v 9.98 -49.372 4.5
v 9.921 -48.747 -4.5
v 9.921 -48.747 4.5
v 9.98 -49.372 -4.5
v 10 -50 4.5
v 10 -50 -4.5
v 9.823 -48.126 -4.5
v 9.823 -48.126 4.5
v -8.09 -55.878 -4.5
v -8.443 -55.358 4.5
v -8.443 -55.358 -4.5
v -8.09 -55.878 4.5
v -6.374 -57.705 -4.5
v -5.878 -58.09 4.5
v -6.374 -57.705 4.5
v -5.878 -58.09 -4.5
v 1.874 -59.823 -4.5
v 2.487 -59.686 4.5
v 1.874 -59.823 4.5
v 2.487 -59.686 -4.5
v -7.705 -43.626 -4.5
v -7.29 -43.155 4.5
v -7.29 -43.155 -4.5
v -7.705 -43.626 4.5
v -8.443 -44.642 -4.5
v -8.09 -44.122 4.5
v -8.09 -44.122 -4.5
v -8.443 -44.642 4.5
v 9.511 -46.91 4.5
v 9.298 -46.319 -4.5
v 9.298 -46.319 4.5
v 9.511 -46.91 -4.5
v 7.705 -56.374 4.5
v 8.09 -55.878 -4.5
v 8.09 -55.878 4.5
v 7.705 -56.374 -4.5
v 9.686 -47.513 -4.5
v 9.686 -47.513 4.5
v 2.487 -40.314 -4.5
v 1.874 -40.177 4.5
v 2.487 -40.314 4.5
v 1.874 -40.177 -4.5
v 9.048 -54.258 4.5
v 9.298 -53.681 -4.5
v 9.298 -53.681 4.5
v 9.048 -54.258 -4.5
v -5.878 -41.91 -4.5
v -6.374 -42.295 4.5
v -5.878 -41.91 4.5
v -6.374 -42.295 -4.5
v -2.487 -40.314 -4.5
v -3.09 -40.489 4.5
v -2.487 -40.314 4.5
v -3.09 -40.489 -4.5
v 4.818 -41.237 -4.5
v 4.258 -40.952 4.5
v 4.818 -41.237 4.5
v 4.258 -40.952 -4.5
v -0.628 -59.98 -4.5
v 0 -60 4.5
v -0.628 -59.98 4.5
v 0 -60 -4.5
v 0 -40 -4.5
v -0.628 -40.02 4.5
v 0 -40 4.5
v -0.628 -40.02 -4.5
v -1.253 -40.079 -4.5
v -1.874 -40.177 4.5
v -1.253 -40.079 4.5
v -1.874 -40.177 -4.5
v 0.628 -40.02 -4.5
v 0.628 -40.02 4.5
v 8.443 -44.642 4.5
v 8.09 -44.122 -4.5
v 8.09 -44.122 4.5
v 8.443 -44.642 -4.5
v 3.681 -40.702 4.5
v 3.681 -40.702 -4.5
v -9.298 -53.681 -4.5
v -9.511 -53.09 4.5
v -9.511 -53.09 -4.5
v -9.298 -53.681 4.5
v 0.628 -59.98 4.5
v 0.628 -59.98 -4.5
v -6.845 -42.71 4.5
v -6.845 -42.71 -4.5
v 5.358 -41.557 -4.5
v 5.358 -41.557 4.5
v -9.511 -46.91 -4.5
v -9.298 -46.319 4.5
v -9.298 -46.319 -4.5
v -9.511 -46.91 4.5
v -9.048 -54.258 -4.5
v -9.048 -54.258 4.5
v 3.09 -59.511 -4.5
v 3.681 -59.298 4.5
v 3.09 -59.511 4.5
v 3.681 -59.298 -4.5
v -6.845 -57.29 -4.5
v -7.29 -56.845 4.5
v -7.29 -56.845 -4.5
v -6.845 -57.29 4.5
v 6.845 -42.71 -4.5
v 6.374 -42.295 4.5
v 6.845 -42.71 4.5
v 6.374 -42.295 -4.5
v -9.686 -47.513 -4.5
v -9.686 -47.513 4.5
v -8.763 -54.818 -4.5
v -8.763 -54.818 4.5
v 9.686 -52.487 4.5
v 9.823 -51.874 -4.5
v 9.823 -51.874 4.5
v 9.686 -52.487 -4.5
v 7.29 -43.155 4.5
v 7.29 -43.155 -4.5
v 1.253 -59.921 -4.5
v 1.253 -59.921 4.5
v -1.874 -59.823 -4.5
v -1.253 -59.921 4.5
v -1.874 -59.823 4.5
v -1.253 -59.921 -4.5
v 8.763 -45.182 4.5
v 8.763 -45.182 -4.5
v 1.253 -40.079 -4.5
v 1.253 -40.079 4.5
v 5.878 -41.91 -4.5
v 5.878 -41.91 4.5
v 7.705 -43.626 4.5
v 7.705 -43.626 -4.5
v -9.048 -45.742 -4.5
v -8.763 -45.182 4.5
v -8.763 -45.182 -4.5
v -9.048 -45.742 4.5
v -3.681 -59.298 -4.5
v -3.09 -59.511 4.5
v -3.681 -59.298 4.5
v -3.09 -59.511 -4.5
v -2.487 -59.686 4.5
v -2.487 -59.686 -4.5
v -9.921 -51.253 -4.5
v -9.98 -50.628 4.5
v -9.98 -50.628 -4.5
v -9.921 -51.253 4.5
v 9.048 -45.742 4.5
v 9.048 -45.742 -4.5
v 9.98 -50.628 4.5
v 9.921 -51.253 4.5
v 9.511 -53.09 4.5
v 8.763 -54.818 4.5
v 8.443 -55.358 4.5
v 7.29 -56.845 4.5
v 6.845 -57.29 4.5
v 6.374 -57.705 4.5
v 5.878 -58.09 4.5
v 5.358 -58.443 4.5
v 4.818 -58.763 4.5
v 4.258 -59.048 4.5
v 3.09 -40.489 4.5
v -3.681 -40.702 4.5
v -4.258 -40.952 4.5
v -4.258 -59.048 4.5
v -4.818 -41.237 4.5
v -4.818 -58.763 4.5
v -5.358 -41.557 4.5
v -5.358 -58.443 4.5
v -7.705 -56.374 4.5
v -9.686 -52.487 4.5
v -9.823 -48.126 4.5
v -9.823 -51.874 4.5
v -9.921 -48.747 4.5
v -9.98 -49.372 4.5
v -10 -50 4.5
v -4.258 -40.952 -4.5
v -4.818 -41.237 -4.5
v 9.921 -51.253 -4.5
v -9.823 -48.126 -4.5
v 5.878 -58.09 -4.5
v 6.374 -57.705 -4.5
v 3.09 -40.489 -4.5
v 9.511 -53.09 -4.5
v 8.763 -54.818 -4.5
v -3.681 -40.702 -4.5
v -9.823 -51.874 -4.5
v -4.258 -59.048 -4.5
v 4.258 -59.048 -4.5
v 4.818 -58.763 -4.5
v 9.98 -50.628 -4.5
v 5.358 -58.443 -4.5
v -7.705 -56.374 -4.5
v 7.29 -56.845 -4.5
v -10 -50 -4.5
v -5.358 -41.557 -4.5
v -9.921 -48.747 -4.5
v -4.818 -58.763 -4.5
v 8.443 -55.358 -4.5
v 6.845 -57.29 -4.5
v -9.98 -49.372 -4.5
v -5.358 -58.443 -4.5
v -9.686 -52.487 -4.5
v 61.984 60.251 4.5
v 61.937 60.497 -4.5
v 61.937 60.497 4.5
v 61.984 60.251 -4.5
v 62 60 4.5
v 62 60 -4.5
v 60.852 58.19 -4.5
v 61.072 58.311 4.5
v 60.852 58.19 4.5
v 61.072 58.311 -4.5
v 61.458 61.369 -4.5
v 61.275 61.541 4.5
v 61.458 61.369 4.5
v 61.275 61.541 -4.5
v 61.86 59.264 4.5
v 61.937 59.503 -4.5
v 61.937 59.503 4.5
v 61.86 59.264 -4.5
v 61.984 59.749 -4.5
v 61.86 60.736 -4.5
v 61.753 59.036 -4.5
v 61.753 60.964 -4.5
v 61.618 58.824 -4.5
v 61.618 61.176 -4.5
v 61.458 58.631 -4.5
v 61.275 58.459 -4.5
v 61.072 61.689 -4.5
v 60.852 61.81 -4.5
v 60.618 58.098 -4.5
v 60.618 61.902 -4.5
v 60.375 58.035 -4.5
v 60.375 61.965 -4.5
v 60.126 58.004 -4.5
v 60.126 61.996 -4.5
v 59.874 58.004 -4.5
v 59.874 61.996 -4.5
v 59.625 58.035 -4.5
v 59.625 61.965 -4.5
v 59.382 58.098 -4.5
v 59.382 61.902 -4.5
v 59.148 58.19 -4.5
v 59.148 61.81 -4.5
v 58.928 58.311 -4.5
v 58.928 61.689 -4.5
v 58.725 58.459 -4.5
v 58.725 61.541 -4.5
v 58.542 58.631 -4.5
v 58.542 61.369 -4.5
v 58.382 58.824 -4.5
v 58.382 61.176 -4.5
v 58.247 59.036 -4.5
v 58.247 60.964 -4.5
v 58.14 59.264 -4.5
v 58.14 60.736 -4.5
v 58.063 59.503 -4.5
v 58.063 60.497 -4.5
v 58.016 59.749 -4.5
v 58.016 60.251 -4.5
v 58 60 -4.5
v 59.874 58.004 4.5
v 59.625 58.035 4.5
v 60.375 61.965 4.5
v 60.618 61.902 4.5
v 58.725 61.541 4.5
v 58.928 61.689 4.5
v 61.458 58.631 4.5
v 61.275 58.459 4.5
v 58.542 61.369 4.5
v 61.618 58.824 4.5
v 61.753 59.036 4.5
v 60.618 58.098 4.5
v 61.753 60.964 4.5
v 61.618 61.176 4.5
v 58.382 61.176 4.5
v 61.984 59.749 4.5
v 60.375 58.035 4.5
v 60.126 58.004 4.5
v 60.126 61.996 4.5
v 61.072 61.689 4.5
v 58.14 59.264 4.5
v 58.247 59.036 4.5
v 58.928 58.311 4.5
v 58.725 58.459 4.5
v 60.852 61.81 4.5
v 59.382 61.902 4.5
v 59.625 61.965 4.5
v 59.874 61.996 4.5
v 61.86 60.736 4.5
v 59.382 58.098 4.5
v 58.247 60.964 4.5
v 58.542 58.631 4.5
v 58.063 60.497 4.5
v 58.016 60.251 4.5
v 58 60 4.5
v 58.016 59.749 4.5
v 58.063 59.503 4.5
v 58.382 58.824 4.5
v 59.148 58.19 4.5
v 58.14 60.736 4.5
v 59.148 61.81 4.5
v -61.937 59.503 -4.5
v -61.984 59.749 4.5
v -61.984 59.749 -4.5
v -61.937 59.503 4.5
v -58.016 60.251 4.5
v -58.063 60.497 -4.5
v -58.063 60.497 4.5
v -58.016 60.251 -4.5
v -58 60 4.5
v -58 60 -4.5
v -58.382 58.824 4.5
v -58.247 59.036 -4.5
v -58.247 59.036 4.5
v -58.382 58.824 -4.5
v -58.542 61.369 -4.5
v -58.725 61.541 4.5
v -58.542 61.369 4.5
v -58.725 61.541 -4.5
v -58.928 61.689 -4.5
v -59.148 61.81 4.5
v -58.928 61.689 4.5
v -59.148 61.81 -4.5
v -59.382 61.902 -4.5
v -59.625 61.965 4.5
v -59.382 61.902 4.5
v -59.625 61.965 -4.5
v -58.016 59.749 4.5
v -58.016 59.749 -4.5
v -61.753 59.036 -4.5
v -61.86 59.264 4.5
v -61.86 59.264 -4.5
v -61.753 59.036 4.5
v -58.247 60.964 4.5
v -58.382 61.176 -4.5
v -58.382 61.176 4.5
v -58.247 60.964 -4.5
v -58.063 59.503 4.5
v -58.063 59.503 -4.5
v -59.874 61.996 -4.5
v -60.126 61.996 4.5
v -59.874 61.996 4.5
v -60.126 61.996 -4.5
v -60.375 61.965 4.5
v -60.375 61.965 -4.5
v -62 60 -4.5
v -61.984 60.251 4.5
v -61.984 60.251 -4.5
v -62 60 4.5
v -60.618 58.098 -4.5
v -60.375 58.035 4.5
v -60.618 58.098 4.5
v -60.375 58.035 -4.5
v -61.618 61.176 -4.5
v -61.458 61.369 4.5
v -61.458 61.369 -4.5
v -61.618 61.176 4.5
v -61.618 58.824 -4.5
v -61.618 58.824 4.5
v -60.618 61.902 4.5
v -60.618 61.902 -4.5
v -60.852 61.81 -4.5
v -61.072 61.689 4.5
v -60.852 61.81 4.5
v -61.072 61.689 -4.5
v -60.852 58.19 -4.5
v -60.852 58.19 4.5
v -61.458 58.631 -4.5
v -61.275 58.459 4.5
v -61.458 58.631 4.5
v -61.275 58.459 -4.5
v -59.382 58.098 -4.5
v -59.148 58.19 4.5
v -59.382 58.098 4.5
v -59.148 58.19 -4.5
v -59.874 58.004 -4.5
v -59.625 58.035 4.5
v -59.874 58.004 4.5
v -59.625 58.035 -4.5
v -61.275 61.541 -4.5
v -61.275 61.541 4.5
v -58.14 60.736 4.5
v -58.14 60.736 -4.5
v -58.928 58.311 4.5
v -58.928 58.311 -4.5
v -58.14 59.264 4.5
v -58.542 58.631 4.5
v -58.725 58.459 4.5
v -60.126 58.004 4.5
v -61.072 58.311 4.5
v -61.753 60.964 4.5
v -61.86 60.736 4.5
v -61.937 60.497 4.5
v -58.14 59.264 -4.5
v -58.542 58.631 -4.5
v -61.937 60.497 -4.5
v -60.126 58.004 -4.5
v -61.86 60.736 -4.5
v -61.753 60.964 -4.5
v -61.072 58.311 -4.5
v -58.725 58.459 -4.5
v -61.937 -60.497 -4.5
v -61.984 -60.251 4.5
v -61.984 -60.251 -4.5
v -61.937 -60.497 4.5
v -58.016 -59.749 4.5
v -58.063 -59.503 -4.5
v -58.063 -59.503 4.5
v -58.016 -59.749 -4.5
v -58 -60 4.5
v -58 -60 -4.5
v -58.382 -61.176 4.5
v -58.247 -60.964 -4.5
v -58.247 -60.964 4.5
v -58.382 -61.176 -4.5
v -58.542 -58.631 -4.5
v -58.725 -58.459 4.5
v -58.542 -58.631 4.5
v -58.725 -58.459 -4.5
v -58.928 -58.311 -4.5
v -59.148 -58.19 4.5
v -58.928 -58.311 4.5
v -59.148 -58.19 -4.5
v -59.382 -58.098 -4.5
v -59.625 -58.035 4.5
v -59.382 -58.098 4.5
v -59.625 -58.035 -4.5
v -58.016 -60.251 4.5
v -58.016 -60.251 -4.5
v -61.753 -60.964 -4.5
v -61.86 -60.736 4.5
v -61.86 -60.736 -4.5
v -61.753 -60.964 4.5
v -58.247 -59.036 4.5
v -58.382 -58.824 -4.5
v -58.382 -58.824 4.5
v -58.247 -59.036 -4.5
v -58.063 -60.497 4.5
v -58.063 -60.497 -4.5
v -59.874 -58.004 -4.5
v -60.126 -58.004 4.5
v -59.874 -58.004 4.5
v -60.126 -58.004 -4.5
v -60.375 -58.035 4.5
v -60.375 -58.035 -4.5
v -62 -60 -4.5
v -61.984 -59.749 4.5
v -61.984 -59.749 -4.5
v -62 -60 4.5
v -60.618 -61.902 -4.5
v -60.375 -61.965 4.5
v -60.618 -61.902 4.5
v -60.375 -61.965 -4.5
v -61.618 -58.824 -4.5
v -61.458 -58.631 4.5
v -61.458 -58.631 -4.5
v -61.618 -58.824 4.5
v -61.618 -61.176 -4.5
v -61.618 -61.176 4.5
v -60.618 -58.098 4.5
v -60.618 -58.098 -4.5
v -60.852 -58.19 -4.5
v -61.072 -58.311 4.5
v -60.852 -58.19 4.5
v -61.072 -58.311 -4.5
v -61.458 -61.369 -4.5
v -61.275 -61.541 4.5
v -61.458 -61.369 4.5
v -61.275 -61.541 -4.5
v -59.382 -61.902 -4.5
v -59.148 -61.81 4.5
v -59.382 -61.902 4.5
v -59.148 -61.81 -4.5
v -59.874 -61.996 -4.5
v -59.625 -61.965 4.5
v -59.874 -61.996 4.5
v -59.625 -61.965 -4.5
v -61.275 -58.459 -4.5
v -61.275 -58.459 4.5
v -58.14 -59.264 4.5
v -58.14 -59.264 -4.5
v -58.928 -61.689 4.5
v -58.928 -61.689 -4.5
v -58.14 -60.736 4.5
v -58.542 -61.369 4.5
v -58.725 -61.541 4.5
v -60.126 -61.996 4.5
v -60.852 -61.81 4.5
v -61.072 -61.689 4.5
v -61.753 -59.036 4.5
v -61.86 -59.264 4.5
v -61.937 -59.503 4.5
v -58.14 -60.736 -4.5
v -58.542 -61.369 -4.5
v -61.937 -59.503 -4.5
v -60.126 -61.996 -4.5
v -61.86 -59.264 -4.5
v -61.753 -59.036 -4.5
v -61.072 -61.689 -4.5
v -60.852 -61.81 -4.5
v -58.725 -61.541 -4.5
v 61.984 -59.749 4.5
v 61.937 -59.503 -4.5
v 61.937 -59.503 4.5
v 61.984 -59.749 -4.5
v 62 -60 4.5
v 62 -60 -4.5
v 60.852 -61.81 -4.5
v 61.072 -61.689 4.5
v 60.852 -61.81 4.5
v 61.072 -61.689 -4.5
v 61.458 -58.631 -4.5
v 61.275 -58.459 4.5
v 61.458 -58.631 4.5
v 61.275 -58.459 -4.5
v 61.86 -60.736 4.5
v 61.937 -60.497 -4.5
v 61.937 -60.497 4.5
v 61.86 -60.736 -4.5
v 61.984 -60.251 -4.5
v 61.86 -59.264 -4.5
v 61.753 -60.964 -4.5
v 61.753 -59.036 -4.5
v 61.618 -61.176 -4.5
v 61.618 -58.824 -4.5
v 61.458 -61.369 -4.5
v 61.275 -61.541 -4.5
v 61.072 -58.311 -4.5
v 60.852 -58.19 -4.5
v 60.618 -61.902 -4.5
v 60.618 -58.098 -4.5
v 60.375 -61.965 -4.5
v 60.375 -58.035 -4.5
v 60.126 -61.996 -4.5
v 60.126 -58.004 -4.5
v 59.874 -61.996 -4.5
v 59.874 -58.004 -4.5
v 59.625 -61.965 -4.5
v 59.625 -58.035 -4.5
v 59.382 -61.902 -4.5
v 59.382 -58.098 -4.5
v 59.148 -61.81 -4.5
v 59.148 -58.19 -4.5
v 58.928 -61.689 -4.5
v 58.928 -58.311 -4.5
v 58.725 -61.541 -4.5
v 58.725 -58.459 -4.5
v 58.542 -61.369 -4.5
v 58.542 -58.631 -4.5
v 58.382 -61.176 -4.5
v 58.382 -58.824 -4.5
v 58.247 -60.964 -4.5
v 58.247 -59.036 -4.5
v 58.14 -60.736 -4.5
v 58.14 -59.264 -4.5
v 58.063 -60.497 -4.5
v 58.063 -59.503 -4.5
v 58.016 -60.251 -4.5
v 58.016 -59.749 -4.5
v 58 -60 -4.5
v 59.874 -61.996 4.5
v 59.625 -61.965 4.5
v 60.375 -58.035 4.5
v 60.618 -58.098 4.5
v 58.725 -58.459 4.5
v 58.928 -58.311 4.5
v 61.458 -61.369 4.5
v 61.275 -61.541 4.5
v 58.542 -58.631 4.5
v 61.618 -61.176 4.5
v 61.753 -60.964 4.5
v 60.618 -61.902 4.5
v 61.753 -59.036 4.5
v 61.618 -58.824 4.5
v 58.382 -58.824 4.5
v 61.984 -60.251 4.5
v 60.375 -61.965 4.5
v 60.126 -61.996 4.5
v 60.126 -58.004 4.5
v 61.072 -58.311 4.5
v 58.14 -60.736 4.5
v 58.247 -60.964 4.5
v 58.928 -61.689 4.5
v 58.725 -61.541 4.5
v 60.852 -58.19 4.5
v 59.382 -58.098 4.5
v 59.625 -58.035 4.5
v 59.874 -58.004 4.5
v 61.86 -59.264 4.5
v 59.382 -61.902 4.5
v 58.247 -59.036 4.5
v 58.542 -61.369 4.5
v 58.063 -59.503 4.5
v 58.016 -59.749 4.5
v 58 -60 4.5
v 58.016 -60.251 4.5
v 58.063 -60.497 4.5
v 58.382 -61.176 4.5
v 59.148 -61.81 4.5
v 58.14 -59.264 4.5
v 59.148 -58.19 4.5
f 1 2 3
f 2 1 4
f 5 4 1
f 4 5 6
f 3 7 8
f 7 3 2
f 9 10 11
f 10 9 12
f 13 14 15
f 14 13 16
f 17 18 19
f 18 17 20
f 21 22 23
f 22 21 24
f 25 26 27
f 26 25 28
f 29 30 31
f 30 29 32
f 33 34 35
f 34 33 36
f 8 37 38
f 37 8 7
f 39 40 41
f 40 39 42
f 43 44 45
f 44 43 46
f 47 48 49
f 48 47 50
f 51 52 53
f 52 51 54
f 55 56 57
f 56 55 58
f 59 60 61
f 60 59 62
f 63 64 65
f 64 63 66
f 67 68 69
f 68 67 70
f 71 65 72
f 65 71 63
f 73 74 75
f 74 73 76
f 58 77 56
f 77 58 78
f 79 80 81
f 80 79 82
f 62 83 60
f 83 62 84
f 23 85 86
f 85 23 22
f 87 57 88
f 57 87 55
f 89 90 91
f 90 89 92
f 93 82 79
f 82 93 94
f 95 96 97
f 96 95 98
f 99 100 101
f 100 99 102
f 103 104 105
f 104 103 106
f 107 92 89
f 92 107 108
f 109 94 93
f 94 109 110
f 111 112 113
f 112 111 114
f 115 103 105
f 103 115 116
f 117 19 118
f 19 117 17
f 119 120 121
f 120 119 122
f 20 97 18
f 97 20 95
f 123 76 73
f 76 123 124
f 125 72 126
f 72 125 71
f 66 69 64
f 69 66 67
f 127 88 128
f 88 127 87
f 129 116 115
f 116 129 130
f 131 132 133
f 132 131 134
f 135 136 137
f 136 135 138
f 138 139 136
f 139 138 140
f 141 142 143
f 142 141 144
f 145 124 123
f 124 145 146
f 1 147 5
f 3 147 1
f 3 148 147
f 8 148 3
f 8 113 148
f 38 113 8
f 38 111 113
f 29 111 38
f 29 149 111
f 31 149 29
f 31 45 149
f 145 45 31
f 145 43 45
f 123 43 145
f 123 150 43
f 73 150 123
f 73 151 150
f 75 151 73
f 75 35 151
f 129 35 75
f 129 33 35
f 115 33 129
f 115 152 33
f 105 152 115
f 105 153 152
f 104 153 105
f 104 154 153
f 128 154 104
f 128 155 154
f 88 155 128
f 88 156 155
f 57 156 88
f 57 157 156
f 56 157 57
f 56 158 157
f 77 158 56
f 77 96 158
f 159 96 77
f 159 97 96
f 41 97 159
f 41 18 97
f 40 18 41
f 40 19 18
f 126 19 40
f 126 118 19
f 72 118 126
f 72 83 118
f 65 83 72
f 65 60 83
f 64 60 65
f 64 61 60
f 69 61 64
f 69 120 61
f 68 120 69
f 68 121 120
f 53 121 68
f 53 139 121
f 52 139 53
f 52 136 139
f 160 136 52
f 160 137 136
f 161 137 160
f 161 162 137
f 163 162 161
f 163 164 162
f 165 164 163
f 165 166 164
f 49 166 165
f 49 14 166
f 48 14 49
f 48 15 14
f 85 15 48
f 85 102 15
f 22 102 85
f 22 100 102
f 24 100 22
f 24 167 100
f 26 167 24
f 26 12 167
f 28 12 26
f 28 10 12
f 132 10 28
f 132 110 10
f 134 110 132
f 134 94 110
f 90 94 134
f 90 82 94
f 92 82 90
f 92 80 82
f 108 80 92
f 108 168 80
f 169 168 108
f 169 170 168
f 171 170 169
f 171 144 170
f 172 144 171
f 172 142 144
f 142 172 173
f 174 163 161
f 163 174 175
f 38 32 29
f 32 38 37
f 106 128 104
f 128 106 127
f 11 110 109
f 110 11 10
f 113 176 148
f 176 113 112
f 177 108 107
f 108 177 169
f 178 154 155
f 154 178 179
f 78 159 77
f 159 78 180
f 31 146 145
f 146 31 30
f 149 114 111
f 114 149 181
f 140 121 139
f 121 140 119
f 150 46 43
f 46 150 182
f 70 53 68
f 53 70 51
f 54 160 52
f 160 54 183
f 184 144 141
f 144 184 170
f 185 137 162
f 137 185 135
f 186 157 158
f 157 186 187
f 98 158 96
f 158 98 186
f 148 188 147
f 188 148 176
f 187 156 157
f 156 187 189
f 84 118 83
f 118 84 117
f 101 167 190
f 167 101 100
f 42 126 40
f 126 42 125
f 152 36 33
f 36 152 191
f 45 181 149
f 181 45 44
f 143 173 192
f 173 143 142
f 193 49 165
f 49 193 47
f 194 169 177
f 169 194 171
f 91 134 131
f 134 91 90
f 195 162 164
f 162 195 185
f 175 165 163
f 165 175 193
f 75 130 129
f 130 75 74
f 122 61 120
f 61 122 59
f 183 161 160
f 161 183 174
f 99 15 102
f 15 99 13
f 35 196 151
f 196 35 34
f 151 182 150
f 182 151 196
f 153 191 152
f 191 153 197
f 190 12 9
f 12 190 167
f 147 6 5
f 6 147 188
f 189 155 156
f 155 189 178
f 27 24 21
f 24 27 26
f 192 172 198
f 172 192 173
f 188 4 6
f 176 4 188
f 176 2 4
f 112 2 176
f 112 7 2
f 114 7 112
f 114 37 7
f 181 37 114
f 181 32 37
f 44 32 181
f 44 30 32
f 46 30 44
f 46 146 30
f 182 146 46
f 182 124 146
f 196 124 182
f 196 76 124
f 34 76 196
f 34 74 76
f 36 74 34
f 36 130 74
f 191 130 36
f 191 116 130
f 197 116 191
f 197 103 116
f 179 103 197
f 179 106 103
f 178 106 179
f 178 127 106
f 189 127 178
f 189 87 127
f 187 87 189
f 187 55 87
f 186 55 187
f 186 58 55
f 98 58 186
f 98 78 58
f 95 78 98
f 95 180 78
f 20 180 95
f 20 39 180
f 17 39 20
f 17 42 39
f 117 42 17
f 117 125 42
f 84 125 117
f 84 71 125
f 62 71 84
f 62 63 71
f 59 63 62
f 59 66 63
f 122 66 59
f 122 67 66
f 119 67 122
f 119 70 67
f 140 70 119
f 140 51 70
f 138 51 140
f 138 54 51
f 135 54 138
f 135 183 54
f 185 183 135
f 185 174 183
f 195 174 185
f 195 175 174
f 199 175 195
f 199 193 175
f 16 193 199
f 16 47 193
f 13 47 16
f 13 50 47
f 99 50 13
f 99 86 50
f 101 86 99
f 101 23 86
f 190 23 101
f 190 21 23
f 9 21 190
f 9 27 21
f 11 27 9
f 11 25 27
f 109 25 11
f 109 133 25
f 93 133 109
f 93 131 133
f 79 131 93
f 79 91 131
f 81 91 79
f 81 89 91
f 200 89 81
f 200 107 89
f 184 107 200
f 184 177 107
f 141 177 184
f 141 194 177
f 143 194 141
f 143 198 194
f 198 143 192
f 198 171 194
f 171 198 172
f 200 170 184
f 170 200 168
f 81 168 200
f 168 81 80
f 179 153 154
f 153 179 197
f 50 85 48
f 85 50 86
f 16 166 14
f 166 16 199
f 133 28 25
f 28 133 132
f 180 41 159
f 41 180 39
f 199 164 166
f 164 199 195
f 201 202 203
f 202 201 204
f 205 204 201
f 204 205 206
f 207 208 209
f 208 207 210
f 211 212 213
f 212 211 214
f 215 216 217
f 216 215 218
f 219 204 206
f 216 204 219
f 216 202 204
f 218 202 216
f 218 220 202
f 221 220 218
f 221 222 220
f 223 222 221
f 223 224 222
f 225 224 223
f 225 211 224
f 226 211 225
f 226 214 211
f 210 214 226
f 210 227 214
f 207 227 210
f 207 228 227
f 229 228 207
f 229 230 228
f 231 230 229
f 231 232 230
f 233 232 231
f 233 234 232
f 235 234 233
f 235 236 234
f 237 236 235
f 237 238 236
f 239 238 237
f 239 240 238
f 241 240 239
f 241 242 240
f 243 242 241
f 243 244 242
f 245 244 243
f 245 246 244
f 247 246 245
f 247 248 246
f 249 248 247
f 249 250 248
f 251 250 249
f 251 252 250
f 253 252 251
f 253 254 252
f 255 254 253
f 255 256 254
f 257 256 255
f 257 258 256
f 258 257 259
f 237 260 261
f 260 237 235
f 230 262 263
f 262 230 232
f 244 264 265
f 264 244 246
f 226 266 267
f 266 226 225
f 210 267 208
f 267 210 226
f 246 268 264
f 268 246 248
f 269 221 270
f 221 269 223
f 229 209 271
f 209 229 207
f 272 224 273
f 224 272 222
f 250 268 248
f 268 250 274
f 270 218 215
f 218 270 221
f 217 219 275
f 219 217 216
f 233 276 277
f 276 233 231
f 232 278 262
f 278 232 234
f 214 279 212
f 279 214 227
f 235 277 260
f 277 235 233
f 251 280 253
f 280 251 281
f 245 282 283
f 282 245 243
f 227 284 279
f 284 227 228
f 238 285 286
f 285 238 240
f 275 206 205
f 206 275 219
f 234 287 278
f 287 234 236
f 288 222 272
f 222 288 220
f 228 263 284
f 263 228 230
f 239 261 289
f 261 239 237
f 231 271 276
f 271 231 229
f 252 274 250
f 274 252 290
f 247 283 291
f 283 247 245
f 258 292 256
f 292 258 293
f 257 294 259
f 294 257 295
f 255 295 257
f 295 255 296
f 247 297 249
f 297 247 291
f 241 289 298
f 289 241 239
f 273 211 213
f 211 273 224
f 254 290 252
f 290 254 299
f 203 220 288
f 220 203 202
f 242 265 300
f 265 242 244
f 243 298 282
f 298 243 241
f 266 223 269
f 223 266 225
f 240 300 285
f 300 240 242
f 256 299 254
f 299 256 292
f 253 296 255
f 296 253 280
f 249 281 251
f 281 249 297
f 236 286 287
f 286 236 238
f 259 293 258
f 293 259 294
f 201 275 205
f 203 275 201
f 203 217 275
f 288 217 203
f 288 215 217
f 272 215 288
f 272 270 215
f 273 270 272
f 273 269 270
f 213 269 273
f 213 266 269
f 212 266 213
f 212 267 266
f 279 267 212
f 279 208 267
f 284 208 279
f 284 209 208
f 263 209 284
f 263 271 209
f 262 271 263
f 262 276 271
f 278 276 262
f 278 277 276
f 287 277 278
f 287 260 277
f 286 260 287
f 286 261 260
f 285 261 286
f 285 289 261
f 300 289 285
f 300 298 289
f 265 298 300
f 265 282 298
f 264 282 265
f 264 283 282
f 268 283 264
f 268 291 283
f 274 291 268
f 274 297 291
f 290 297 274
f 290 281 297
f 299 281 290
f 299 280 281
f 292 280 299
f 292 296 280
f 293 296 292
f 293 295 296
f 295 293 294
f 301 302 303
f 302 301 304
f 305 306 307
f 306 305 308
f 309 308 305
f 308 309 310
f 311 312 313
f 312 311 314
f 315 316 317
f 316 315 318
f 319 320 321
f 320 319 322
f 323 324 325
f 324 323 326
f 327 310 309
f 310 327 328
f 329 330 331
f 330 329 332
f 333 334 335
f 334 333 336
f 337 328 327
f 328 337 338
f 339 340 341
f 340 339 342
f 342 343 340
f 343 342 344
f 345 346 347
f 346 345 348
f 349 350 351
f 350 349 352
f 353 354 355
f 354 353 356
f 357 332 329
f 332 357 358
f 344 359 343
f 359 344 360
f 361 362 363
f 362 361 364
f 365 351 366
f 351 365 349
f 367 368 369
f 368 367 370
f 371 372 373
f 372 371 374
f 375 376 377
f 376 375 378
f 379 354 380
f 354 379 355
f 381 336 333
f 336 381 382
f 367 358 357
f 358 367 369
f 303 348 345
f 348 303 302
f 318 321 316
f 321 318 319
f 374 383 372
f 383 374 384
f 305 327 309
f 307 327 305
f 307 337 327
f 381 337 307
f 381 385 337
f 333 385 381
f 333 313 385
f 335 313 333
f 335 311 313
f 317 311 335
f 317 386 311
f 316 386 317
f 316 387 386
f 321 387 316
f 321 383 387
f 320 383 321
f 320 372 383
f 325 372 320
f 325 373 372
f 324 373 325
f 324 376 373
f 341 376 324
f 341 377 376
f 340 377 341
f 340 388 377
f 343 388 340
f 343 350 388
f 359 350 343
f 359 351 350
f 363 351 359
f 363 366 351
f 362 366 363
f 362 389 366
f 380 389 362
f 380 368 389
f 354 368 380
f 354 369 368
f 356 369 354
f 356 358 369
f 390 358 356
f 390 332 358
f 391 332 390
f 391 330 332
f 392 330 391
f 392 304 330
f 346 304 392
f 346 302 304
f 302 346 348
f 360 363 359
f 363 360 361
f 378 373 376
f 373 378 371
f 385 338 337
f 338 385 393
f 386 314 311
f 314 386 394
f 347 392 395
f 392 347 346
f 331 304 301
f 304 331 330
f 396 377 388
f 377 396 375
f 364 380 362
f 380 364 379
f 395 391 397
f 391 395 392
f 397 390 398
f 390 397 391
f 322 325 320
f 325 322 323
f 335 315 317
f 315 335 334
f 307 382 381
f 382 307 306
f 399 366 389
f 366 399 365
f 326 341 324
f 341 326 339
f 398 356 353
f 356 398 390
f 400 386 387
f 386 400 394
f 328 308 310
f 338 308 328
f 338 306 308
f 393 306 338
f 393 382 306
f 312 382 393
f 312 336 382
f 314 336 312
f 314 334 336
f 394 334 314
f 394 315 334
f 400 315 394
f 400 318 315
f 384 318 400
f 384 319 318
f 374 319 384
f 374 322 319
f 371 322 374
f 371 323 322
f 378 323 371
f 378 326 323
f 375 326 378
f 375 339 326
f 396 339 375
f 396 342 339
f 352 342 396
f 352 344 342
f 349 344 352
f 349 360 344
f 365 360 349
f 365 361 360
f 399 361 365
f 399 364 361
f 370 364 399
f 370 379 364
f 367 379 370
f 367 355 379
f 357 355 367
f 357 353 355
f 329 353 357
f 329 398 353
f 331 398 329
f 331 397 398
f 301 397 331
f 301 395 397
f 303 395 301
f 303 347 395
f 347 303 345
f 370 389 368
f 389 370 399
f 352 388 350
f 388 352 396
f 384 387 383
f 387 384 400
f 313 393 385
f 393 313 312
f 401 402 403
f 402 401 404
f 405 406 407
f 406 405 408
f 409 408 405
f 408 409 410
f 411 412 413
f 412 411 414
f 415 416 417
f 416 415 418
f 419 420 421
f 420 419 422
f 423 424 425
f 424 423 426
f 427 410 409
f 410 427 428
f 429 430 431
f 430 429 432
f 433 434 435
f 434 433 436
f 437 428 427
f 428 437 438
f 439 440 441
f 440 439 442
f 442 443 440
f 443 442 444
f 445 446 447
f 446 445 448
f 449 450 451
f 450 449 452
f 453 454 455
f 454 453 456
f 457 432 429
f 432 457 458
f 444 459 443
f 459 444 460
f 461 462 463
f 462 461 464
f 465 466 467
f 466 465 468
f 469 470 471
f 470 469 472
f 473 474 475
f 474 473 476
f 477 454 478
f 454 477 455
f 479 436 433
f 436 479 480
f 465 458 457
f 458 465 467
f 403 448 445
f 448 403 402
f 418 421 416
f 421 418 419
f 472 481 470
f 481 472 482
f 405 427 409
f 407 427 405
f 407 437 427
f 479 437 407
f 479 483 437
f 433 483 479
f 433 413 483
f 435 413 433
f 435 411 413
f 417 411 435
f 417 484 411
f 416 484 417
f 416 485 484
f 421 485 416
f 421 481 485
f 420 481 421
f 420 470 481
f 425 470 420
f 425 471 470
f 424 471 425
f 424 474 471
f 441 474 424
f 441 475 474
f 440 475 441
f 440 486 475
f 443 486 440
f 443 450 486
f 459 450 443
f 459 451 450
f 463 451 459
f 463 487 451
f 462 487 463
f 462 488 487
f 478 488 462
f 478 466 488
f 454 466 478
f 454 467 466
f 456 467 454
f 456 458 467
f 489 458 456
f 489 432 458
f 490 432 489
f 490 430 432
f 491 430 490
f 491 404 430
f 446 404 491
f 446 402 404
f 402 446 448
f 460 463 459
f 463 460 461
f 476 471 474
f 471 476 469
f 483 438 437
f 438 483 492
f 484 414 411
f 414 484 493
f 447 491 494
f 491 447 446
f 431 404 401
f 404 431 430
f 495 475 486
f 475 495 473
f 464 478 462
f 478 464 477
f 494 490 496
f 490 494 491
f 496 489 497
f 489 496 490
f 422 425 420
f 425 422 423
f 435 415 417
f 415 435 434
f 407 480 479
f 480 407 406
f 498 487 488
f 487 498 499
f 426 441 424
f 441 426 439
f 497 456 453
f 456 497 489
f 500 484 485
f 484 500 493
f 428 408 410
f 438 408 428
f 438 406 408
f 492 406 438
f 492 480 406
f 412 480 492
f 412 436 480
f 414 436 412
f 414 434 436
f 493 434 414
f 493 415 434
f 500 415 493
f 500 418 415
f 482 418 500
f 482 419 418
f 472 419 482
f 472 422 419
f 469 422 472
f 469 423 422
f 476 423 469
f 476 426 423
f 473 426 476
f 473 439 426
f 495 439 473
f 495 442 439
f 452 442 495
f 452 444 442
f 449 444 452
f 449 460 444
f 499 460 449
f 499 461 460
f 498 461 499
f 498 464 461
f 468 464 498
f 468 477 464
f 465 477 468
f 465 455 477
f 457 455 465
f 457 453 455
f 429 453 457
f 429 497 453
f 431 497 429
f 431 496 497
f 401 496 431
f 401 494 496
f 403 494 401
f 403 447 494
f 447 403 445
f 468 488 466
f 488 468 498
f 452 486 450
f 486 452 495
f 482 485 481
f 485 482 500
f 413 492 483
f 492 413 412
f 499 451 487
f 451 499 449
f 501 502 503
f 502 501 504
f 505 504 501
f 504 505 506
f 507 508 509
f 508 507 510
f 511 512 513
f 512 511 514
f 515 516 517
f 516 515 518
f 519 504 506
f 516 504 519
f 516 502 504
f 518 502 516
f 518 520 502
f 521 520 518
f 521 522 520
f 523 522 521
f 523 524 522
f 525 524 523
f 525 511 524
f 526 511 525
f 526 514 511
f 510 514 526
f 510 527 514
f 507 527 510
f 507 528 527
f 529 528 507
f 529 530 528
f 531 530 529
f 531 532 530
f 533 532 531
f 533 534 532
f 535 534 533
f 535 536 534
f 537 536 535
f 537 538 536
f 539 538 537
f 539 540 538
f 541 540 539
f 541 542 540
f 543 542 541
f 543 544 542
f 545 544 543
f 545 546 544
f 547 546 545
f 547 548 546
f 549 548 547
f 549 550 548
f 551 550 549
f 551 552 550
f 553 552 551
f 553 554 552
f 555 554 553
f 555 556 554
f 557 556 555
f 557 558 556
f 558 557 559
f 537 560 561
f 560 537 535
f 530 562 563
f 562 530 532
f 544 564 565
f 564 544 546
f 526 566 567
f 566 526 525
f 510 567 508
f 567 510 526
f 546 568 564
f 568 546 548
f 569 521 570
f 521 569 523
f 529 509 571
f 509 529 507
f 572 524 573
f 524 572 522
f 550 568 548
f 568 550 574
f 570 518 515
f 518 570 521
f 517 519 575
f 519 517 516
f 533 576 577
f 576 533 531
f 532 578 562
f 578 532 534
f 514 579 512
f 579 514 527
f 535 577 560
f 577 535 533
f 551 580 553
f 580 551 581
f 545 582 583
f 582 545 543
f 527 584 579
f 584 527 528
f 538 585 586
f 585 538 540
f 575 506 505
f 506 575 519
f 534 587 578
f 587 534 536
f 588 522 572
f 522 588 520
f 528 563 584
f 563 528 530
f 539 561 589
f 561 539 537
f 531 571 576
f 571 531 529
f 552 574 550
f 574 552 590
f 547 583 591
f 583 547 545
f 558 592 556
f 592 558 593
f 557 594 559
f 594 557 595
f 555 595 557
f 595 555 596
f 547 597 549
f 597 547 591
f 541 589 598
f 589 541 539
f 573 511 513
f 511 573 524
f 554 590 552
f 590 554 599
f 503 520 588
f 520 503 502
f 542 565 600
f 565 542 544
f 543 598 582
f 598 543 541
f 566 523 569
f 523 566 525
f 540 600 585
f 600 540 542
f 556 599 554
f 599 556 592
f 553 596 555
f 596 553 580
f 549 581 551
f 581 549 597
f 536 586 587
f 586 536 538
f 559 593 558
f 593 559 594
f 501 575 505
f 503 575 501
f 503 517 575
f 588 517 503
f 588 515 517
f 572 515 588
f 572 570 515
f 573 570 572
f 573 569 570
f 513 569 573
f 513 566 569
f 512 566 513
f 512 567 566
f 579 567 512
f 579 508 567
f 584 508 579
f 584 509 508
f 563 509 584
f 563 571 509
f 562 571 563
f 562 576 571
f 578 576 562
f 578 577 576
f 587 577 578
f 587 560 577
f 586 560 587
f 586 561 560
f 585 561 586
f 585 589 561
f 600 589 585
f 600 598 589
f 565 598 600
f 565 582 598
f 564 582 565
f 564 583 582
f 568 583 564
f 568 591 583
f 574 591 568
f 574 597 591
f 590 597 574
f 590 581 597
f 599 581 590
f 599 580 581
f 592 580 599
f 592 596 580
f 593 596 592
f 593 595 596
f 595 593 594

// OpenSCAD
/* [Interface Dimensions] */
bolt_spacing = 120; 
screw_hole_dia = 3.4; 
insert_hole_dia = 4.0; 
cable_hole_dia = 20; 

/* [Cutter Settings] */
cutter_height = 9; 
selected_dia = insert_hole_dia; 

module interface_pattern() {
    offset_val = bolt_spacing / 2;
    
    // ALIGNMENT CALCULATION
    // The center of the hole is moved up by its radius relative to the bottom screw line.
    // This makes the bottom edge of the circle touch the line connecting the screw centers.
    cable_y_pos = -offset_val + (cable_hole_dia / 2);

    union() {
        // 1. The Cable Hole (Aligned)
        translate([0, cable_y_pos, 0]) 
            cylinder(h = cutter_height, d = cable_hole_dia, center = true, $fn=100);
        
        // 2. The 4 Bolt Holes
        translate([offset_val, offset_val, 0])
            cylinder(h = cutter_height, d = selected_dia, center = true, $fn=50);
            
        translate([-offset_val, offset_val, 0])
            cylinder(h = cutter_height, d = selected_dia, center = true, $fn=50);
            
        translate([-offset_val, -offset_val, 0])
            cylinder(h = cutter_height, d = selected_dia, center = true, $fn=50);
            
        translate([offset_val, -offset_val, 0])
            cylinder(h = cutter_height, d = selected_dia, center = true, $fn=50);
    }
}

interface_pattern();
